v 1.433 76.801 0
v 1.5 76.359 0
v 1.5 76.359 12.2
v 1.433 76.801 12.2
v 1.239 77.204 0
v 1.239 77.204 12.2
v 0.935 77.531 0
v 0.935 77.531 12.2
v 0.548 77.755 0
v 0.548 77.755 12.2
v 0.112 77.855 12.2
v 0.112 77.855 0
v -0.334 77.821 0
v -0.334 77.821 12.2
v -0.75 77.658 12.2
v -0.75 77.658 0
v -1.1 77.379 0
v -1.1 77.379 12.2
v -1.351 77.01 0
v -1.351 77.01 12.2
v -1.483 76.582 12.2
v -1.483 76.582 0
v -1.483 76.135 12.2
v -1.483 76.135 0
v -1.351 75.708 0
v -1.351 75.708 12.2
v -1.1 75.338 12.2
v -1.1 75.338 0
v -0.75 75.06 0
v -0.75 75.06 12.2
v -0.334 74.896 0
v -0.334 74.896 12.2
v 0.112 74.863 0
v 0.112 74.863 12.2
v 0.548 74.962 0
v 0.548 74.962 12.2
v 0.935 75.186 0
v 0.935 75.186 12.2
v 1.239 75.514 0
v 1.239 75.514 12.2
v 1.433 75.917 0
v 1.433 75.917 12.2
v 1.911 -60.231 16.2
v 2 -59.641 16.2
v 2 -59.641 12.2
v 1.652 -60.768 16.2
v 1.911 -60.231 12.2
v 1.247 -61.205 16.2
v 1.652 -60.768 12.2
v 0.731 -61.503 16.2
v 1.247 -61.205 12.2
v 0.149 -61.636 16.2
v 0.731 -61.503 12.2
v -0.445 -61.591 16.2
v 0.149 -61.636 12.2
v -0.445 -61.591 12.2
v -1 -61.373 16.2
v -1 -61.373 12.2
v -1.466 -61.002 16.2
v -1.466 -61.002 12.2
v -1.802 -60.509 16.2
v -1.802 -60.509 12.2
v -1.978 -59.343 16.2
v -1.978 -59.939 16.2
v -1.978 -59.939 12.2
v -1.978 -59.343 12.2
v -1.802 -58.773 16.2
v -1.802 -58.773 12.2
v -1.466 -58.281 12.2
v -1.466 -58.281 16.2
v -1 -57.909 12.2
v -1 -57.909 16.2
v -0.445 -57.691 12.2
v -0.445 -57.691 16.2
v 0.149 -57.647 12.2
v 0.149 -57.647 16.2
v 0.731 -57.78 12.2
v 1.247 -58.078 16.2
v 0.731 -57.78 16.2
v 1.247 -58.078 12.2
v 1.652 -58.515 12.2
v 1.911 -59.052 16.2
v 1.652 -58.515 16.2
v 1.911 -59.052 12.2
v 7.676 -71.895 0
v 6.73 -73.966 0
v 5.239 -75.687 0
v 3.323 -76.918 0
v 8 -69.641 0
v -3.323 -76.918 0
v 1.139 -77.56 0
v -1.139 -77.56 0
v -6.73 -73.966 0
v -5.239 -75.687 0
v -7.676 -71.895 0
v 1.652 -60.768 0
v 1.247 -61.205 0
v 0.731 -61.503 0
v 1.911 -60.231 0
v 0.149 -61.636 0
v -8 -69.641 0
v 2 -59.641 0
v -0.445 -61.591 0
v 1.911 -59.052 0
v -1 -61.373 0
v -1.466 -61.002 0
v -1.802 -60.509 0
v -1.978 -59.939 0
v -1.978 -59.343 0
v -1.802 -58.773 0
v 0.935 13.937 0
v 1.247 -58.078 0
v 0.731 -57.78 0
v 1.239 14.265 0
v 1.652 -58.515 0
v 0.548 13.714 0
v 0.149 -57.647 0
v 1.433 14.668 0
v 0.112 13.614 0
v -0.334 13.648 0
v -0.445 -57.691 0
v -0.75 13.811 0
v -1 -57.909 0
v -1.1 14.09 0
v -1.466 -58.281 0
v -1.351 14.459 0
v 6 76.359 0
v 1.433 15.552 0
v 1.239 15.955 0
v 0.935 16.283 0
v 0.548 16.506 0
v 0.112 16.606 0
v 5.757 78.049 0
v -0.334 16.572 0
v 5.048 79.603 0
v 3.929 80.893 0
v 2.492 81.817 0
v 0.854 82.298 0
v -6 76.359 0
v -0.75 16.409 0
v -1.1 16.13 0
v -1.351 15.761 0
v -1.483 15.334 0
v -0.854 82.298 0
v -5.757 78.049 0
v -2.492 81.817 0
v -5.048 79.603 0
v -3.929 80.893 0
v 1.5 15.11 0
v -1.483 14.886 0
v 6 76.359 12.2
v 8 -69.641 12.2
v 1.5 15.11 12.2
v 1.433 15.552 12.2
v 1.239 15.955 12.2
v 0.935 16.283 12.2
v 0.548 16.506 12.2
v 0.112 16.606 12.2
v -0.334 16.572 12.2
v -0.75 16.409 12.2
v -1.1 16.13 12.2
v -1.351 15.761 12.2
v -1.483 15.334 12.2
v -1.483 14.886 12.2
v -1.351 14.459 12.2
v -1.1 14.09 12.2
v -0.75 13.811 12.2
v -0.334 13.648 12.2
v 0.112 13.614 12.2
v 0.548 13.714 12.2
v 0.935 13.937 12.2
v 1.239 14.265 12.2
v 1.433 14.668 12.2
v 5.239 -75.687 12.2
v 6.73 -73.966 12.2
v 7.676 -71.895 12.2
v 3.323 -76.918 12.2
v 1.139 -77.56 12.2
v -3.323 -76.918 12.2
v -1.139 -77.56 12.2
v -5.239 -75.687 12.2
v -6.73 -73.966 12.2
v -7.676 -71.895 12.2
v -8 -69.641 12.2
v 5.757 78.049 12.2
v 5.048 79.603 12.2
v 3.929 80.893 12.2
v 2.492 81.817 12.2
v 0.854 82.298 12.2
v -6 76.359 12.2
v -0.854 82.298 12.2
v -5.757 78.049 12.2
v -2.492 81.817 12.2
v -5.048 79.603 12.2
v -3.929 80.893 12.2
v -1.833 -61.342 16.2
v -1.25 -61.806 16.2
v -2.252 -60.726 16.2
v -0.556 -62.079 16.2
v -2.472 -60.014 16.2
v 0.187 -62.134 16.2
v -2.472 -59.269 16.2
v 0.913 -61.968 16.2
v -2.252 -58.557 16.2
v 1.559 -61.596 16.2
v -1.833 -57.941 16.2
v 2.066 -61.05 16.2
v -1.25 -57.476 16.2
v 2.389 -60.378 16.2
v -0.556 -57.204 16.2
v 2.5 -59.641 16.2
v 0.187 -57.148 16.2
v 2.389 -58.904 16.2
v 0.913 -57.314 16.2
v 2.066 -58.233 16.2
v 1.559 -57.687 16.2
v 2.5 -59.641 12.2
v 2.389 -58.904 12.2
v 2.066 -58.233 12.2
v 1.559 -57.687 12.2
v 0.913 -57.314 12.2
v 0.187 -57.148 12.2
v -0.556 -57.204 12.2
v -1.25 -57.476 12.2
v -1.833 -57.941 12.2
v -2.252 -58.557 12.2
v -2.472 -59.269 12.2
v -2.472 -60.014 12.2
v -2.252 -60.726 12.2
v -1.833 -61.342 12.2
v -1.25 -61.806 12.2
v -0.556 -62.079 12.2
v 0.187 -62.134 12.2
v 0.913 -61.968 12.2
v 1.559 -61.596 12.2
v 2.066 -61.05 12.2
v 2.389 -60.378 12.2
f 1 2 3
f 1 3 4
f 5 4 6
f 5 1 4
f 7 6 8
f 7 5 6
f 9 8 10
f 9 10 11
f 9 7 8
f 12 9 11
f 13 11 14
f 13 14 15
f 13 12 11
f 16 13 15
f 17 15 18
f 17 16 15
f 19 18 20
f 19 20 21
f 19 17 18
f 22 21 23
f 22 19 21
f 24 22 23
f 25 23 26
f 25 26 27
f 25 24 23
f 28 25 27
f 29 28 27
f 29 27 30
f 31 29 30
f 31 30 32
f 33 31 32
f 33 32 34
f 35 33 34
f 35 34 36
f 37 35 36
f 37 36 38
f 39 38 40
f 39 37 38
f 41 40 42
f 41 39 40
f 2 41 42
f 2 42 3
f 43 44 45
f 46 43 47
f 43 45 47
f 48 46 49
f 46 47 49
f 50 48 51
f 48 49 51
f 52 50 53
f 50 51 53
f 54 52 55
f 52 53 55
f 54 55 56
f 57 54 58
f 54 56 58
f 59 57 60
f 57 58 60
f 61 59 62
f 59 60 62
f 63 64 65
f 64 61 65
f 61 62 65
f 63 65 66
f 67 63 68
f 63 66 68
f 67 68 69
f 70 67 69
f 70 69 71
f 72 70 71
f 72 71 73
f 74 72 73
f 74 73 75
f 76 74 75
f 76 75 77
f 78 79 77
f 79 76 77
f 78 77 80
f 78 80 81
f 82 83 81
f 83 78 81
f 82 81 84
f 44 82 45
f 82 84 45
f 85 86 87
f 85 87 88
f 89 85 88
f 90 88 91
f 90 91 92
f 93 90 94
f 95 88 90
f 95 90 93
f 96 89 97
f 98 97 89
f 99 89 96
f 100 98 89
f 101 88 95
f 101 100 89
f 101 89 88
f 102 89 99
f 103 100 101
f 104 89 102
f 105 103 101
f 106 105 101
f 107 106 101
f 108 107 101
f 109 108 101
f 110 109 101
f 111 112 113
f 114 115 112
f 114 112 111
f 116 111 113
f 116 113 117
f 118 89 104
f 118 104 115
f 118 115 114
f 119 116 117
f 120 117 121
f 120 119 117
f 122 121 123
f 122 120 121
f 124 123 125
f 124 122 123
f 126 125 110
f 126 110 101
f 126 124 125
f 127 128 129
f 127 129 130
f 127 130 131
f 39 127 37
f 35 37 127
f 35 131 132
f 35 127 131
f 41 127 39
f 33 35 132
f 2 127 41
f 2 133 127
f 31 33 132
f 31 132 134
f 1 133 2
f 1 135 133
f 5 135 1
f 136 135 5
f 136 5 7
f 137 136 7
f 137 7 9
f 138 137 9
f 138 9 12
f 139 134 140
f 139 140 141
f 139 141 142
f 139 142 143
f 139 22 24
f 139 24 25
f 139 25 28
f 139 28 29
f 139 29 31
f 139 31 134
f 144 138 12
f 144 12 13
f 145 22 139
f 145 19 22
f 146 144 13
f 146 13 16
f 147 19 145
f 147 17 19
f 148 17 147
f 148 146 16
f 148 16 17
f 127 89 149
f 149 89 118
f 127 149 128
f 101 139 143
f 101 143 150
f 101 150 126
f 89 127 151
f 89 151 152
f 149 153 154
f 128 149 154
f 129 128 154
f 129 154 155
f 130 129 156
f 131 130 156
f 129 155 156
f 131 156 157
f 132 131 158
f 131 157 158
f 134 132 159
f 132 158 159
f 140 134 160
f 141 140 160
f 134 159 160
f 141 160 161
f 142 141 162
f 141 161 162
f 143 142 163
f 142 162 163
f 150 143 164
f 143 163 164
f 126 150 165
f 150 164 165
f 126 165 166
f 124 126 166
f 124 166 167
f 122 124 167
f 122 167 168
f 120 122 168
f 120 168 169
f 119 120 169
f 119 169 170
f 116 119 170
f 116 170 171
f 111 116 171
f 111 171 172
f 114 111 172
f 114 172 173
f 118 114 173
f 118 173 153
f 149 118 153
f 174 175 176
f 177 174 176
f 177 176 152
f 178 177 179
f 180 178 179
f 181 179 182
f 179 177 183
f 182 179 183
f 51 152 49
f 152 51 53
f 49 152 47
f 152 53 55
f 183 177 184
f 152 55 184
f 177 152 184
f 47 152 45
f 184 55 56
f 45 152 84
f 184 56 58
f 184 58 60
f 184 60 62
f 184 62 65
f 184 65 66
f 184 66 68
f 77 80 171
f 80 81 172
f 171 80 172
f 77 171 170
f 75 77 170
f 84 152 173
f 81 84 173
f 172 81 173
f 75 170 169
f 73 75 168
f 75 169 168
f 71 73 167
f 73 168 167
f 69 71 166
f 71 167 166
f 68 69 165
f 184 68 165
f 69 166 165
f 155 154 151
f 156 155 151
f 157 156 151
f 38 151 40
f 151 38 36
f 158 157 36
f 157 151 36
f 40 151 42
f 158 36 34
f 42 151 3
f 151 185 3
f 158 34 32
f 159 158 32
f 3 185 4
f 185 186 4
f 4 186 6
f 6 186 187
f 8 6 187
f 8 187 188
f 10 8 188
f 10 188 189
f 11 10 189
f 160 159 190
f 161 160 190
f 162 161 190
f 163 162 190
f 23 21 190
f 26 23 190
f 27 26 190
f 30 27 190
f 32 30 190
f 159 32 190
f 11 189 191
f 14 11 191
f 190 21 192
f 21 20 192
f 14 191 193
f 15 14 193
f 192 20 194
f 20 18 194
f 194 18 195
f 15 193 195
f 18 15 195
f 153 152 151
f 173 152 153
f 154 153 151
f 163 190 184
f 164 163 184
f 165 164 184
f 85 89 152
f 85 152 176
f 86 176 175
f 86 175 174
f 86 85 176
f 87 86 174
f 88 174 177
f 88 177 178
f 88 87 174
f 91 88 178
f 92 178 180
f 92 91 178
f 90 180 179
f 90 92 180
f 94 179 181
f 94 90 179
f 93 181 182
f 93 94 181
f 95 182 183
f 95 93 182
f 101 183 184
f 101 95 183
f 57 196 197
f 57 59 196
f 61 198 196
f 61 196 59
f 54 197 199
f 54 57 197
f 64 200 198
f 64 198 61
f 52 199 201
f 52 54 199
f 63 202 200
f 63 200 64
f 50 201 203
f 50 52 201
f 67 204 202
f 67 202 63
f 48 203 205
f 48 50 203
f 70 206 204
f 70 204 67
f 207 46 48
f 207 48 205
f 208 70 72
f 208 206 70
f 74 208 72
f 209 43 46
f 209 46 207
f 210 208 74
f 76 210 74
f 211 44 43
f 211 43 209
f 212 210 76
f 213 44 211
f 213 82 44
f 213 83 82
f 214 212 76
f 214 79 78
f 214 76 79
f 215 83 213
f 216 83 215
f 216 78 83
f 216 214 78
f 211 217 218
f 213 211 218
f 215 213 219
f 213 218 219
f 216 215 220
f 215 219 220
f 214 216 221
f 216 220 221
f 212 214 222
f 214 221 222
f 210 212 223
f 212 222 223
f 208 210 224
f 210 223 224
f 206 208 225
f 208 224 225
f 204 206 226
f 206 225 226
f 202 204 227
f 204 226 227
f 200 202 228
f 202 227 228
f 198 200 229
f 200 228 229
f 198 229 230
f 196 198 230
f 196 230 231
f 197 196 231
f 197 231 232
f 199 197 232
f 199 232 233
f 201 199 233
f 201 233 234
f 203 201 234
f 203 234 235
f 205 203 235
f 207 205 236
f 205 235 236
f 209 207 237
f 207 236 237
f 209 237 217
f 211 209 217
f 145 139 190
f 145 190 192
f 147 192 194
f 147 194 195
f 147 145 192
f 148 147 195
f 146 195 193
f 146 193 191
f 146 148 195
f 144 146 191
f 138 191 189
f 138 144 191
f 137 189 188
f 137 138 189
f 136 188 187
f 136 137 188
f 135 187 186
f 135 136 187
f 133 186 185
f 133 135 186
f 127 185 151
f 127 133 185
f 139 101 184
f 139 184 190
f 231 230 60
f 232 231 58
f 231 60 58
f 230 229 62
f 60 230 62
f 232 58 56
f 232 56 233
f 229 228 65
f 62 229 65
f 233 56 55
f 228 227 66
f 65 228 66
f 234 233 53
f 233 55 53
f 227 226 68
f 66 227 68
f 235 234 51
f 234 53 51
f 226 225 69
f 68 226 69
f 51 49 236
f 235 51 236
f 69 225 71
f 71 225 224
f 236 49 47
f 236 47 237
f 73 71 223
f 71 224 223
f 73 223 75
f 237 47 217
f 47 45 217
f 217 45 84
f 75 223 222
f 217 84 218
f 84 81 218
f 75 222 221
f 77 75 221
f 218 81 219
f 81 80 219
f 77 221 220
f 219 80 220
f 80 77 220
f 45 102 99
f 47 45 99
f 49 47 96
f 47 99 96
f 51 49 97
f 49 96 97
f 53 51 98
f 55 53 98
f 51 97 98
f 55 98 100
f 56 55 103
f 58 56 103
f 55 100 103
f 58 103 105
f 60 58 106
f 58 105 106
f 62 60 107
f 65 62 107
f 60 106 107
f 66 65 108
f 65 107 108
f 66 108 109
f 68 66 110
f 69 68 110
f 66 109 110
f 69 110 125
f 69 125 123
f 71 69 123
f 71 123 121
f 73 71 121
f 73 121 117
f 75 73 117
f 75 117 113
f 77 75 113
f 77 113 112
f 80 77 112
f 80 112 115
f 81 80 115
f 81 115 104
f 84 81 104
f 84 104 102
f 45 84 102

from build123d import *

# Parameters (mm, degrees)
SKETCH2_R           = 1.5
BOSS_EXTRUDE1_DEPTH = 12.2
SKETCH3_R           = 2.5
BOSS_EXTRUDE2_DEPTH = 4
SKETCH4_R           = 2
CUT_EXTRUDE1_DEPTH  = 2
SKETCH5_R           = 2
CUT_EXTRUDE2_DEPTH  = 20
SKETCH7_R           = 1.5
CUT_EXTRUDE3_DEPTH  = 20


with BuildPart() as part:
    # Sketch2 → Boss-Extrude1 (new body)
    with BuildSketch(Plane.XY):
        with BuildLine():
            Line((6, 76.358744395), (8, -69.641255605))
            ThreePointArc((8, -69.641255605), (0, -77.641255605), (-8, -69.641255605))
            Line((-8, -69.641255605), (-6, 76.358744395))
            ThreePointArc((-6, 76.358744395), (0, 82.358744395), (6, 76.358744395))
        make_face()
        with Locations((0, 76.358744395)):
            Circle(SKETCH2_R, mode=Mode.SUBTRACT)
    extrude(amount=BOSS_EXTRUDE1_DEPTH)


with BuildPart() as body_2:
    # Sketch3 → Boss-Extrude2 (new body)
    with BuildSketch(Plane.XY.offset(12.2)):
        with Locations((0, -59.641255605)):
            Circle(SKETCH3_R)
    extrude(amount=BOSS_EXTRUDE2_DEPTH)

    # Sketch4 → Cut-Extrude1 (cut)
    with BuildSketch(Plane.XY.offset(16.2)):
        with Locations((0, -59.641255605)):
            Circle(SKETCH4_R)
    extrude(amount=-CUT_EXTRUDE1_DEPTH, mode=Mode.SUBTRACT)


with BuildPart() as cut_extrude2_tool:
    # Sketch5 → Cut-Extrude2 (new body)
    with BuildSketch(Plane(origin=(0, 0, 0), x_dir=(-1, 0, 0), z_dir=(0, 0, -1))):
        with Locations(Location((0, -59.641255605, 0), (0, 0, 180))):
            Circle(SKETCH5_R)
    extrude(amount=-CUT_EXTRUDE2_DEPTH)


with BuildPart() as part_1:
    add(part.part)

    # Cut-Extrude2: cut by cut_extrude2_tool
    add(cut_extrude2_tool.part, mode=Mode.SUBTRACT)

    # Sketch7 → Cut-Extrude3 (cut)
    with BuildSketch(Plane.XY.offset(12.2)):
        with Locations((0, 15.110001993)):
            Circle(SKETCH7_R)
    extrude(amount=-CUT_EXTRUDE3_DEPTH, mode=Mode.SUBTRACT)


with BuildPart() as body_2_1:
    add(body_2.part)

    # Cut-Extrude2: cut by cut_extrude2_tool
    add(cut_extrude2_tool.part, mode=Mode.SUBTRACT)


solid = Compound([part_1.part, body_2_1.part])
